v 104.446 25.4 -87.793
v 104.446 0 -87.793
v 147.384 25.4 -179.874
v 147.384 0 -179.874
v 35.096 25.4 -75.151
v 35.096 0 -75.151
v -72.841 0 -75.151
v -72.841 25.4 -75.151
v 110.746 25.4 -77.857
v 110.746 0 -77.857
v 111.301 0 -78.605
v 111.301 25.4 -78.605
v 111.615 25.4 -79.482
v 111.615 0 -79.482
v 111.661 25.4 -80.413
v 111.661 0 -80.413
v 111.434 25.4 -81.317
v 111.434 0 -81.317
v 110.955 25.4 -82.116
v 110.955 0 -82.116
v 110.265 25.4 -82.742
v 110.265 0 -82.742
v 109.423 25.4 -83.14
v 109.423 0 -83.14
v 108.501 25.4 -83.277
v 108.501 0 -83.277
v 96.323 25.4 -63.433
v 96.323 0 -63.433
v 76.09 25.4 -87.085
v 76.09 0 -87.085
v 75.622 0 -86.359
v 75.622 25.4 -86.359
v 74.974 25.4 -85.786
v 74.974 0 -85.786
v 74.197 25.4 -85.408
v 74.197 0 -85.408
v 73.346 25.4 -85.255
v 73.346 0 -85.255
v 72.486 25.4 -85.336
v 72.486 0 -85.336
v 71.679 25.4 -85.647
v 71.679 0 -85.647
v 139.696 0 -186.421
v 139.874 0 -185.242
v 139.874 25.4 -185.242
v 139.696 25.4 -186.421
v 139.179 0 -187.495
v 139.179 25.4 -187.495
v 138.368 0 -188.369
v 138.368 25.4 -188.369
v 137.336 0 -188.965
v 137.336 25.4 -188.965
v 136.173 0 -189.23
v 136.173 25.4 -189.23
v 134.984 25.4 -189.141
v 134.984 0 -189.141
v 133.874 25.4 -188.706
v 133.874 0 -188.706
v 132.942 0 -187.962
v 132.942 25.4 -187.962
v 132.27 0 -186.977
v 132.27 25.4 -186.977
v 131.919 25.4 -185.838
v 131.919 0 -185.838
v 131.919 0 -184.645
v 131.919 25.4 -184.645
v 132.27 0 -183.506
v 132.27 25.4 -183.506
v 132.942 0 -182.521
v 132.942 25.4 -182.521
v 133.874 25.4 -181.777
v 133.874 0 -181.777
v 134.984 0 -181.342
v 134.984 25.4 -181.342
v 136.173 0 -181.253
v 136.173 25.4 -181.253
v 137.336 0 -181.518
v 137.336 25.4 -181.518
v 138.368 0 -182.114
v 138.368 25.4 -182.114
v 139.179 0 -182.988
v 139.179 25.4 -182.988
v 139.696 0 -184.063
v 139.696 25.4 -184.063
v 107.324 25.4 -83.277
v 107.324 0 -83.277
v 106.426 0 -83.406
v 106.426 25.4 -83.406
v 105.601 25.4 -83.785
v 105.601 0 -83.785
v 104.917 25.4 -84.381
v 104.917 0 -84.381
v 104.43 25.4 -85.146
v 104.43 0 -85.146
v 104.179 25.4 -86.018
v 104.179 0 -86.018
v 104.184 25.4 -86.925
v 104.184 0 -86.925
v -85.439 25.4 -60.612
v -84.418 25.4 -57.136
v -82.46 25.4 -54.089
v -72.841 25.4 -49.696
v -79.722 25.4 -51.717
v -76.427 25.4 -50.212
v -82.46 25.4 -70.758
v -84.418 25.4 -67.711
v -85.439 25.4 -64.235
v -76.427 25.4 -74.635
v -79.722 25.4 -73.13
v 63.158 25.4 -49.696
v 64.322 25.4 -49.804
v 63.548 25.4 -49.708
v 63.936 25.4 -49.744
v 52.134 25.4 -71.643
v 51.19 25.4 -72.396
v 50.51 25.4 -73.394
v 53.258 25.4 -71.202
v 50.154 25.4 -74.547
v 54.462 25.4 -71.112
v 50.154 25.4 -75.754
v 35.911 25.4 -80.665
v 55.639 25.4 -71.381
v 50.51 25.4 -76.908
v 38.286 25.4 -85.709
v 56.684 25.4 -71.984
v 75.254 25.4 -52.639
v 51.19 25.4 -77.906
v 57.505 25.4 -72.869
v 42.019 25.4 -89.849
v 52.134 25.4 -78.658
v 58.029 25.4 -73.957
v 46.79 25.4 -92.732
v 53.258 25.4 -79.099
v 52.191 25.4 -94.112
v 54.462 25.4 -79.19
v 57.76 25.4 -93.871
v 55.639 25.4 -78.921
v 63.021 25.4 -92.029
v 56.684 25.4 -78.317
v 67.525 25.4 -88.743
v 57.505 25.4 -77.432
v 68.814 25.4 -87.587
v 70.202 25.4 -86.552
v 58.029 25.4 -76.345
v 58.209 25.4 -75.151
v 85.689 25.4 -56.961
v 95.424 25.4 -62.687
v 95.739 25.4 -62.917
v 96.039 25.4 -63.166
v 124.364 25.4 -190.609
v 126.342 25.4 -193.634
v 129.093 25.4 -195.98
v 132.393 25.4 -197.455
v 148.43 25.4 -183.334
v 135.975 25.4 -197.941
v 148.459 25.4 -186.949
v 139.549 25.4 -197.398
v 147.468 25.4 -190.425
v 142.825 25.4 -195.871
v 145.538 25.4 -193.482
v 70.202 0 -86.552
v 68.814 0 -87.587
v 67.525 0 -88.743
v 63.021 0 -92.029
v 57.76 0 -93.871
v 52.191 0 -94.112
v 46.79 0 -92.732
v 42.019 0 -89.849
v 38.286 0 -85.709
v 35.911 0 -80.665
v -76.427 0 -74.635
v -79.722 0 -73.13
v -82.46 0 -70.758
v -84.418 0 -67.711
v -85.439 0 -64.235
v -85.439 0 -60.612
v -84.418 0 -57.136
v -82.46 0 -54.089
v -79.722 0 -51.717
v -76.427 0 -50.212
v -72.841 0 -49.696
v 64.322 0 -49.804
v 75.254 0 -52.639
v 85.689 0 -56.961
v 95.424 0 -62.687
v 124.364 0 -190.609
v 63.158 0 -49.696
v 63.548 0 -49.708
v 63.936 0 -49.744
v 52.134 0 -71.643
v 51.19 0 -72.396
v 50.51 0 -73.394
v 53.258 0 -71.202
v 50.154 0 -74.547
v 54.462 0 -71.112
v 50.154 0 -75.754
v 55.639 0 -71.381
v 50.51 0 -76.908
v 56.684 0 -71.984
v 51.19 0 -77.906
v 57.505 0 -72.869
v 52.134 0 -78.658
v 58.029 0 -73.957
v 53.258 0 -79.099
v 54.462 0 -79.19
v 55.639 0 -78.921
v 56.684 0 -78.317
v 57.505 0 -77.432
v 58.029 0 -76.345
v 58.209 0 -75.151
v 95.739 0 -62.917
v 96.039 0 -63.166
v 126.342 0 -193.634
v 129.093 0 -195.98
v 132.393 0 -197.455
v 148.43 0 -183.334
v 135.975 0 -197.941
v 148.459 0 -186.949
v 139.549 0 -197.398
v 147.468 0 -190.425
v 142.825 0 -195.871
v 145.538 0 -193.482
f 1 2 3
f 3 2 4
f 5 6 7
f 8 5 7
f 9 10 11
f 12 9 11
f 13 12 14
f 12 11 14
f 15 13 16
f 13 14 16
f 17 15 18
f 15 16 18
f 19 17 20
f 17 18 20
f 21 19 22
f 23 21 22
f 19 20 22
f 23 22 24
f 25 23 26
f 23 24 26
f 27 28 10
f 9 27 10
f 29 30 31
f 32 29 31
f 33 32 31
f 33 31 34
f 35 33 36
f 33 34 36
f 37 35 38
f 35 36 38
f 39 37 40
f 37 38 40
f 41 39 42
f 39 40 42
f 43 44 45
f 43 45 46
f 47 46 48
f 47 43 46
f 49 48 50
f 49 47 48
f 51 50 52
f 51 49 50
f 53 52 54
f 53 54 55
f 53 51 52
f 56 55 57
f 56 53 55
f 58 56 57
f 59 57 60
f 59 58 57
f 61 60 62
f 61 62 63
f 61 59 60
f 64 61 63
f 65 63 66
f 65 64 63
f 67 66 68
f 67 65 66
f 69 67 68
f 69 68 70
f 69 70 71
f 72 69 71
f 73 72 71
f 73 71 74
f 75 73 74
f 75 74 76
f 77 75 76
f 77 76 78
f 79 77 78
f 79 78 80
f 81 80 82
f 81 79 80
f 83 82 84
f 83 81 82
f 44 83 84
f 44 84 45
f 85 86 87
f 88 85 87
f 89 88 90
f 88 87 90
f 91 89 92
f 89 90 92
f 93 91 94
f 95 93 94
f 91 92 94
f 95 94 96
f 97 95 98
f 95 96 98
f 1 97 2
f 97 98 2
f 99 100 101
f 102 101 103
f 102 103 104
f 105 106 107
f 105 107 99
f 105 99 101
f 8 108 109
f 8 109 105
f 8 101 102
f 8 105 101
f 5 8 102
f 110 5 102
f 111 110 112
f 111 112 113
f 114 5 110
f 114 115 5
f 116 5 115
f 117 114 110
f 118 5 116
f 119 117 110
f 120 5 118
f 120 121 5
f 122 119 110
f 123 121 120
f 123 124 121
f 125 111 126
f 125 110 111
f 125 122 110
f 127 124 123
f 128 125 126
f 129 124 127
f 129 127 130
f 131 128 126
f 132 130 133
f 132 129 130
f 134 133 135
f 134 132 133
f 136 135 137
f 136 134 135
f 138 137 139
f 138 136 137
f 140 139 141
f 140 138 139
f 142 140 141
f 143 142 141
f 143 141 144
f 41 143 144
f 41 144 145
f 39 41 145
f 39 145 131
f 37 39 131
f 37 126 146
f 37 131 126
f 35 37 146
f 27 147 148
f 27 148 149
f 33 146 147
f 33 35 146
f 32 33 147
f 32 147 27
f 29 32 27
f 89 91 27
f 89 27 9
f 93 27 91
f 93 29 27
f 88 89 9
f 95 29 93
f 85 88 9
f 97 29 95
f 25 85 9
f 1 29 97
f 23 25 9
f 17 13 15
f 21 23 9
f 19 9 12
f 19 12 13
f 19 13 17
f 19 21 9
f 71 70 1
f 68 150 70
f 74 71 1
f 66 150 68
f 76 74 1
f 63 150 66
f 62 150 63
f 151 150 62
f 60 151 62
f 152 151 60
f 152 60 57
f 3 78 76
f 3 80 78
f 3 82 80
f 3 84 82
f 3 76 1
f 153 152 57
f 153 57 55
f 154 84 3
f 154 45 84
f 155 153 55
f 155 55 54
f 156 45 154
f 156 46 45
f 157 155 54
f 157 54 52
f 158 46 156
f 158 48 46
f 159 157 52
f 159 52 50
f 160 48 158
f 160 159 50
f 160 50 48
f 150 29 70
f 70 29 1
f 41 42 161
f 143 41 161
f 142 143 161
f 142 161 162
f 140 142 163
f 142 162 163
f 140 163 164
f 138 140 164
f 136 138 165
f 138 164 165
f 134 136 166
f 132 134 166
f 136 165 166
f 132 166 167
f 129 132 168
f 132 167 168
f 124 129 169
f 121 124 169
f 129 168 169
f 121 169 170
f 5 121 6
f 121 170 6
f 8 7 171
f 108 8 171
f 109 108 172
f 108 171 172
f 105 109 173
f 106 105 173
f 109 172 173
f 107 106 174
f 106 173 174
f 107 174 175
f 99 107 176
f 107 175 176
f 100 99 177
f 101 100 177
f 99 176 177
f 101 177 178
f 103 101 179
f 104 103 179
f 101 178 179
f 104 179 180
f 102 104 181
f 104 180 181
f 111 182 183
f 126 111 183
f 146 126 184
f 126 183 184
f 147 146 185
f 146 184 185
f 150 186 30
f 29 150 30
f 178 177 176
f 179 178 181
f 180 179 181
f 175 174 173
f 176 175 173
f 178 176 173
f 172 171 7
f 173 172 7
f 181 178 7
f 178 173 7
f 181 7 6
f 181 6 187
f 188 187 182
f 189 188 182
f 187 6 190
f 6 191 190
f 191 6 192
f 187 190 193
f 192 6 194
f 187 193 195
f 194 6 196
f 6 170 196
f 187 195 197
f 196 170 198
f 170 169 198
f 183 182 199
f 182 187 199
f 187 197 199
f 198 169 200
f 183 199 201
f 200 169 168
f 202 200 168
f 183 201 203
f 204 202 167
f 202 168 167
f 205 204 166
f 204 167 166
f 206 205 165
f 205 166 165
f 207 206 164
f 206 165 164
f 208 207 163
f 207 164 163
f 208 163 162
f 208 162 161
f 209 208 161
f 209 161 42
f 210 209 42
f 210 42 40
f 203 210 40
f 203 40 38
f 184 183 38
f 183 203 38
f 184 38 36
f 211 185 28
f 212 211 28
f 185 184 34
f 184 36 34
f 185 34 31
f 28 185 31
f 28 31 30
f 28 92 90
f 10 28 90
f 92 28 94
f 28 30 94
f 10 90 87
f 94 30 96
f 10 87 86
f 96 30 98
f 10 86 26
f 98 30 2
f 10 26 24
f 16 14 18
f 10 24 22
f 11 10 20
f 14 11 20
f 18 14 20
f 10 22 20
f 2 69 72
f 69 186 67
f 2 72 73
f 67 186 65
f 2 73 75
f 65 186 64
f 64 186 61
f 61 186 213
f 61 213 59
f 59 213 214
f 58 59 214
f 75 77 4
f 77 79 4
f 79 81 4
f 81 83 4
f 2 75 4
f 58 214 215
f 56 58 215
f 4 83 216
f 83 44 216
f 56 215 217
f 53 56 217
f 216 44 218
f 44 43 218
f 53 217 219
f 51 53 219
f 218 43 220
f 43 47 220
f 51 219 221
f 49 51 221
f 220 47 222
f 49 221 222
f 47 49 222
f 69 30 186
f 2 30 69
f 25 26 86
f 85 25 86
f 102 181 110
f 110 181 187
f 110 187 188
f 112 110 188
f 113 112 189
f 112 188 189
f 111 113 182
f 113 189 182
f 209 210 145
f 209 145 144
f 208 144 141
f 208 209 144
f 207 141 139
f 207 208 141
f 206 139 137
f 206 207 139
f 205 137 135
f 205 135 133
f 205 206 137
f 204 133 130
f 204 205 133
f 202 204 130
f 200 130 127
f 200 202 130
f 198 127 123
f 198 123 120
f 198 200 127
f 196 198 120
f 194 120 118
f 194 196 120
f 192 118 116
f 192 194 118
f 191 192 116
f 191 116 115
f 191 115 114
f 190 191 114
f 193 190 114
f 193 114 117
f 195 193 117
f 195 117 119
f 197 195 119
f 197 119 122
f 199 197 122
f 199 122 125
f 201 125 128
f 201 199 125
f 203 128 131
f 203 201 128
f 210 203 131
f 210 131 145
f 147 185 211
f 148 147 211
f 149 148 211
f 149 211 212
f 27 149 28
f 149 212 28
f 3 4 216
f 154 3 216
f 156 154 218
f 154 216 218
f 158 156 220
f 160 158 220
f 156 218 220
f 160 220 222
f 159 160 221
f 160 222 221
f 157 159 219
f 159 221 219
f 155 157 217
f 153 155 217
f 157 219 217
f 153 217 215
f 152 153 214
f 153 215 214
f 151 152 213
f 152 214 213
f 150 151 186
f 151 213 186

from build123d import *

# Parameters (mm, degrees)
SKETCH1_R           = 4.05
SKETCH1_R_2         = 4
BOSS_EXTRUDE1_DEPTH = 25.4


with BuildPart() as part:
    # Sketch1 → Boss-Extrude1 (new body)
    with BuildSketch(Plane(origin=(0, 0, 0), x_dir=(1, 0, 0), z_dir=(0, 1, 0))):
        with BuildLine():
            Line((35.095585876, 75.150873895), (-72.841125884, 75.150873895))
            ThreePointArc((-72.841125884, 75.150873895), (-85.568525883, 62.423473896), (-72.841125884, 49.696073896))
            Line((-72.841125884, 49.696073896), (38.270585876, 49.696073896))
            Line((38.270585876, 49.696073896), (63.158100717, 49.696073896))
            ThreePointArc((63.158100717, 49.696073896), (63.742381743, 49.723011689), (64.321705528, 49.803596516))
            ThreePointArc((64.321705528, 49.803596516), (80.546596989, 54.618688797), (95.424112169, 62.686635169))
            ThreePointArc((95.424112169, 62.686635169), (95.890738024, 63.039296868), (96.322934996, 63.433398048))
            Line((96.322934996, 63.433398048), (110.746065504, 77.856528557))
            ThreePointArc((110.746065504, 77.856528557), (111.43431899, 81.316612485), (108.501001474, 83.276592587))
            Line((108.501001474, 83.276592587), (107.323802413, 83.276592587))
            ThreePointArc((107.323802413, 83.276592587), (104.646034573, 84.74566633), (104.44627519, 87.793405568))
            Line((104.44627519, 87.793405568), (147.384290582, 179.874276731))
            ThreePointArc((147.384290582, 179.874276731), (141.241433611, 196.75163755), (124.364072791, 190.608780579))
            Line((124.364072791, 190.608780579), (76.090158478, 87.085037255))
            ThreePointArc((76.090158478, 87.085037255), (74.19673791, 85.408214933), (71.67884134, 85.646901766))
            ThreePointArc((71.67884134, 85.646901766), (69.496098635, 87.053305606), (67.524885923, 88.743470663))
            ThreePointArc((67.524885923, 88.743470663), (46.789721423, 92.732243213), (35.095585876, 75.150873895))
        make_face()
        with Locations((54.158874116, 75.150873895)):
            Circle(SKETCH1_R, mode=Mode.SUBTRACT)
        with Locations((135.874181687, 185.241528655)):
            Circle(SKETCH1_R_2, mode=Mode.SUBTRACT)
    extrude(amount=BOSS_EXTRUDE1_DEPTH)


solid = part.part
